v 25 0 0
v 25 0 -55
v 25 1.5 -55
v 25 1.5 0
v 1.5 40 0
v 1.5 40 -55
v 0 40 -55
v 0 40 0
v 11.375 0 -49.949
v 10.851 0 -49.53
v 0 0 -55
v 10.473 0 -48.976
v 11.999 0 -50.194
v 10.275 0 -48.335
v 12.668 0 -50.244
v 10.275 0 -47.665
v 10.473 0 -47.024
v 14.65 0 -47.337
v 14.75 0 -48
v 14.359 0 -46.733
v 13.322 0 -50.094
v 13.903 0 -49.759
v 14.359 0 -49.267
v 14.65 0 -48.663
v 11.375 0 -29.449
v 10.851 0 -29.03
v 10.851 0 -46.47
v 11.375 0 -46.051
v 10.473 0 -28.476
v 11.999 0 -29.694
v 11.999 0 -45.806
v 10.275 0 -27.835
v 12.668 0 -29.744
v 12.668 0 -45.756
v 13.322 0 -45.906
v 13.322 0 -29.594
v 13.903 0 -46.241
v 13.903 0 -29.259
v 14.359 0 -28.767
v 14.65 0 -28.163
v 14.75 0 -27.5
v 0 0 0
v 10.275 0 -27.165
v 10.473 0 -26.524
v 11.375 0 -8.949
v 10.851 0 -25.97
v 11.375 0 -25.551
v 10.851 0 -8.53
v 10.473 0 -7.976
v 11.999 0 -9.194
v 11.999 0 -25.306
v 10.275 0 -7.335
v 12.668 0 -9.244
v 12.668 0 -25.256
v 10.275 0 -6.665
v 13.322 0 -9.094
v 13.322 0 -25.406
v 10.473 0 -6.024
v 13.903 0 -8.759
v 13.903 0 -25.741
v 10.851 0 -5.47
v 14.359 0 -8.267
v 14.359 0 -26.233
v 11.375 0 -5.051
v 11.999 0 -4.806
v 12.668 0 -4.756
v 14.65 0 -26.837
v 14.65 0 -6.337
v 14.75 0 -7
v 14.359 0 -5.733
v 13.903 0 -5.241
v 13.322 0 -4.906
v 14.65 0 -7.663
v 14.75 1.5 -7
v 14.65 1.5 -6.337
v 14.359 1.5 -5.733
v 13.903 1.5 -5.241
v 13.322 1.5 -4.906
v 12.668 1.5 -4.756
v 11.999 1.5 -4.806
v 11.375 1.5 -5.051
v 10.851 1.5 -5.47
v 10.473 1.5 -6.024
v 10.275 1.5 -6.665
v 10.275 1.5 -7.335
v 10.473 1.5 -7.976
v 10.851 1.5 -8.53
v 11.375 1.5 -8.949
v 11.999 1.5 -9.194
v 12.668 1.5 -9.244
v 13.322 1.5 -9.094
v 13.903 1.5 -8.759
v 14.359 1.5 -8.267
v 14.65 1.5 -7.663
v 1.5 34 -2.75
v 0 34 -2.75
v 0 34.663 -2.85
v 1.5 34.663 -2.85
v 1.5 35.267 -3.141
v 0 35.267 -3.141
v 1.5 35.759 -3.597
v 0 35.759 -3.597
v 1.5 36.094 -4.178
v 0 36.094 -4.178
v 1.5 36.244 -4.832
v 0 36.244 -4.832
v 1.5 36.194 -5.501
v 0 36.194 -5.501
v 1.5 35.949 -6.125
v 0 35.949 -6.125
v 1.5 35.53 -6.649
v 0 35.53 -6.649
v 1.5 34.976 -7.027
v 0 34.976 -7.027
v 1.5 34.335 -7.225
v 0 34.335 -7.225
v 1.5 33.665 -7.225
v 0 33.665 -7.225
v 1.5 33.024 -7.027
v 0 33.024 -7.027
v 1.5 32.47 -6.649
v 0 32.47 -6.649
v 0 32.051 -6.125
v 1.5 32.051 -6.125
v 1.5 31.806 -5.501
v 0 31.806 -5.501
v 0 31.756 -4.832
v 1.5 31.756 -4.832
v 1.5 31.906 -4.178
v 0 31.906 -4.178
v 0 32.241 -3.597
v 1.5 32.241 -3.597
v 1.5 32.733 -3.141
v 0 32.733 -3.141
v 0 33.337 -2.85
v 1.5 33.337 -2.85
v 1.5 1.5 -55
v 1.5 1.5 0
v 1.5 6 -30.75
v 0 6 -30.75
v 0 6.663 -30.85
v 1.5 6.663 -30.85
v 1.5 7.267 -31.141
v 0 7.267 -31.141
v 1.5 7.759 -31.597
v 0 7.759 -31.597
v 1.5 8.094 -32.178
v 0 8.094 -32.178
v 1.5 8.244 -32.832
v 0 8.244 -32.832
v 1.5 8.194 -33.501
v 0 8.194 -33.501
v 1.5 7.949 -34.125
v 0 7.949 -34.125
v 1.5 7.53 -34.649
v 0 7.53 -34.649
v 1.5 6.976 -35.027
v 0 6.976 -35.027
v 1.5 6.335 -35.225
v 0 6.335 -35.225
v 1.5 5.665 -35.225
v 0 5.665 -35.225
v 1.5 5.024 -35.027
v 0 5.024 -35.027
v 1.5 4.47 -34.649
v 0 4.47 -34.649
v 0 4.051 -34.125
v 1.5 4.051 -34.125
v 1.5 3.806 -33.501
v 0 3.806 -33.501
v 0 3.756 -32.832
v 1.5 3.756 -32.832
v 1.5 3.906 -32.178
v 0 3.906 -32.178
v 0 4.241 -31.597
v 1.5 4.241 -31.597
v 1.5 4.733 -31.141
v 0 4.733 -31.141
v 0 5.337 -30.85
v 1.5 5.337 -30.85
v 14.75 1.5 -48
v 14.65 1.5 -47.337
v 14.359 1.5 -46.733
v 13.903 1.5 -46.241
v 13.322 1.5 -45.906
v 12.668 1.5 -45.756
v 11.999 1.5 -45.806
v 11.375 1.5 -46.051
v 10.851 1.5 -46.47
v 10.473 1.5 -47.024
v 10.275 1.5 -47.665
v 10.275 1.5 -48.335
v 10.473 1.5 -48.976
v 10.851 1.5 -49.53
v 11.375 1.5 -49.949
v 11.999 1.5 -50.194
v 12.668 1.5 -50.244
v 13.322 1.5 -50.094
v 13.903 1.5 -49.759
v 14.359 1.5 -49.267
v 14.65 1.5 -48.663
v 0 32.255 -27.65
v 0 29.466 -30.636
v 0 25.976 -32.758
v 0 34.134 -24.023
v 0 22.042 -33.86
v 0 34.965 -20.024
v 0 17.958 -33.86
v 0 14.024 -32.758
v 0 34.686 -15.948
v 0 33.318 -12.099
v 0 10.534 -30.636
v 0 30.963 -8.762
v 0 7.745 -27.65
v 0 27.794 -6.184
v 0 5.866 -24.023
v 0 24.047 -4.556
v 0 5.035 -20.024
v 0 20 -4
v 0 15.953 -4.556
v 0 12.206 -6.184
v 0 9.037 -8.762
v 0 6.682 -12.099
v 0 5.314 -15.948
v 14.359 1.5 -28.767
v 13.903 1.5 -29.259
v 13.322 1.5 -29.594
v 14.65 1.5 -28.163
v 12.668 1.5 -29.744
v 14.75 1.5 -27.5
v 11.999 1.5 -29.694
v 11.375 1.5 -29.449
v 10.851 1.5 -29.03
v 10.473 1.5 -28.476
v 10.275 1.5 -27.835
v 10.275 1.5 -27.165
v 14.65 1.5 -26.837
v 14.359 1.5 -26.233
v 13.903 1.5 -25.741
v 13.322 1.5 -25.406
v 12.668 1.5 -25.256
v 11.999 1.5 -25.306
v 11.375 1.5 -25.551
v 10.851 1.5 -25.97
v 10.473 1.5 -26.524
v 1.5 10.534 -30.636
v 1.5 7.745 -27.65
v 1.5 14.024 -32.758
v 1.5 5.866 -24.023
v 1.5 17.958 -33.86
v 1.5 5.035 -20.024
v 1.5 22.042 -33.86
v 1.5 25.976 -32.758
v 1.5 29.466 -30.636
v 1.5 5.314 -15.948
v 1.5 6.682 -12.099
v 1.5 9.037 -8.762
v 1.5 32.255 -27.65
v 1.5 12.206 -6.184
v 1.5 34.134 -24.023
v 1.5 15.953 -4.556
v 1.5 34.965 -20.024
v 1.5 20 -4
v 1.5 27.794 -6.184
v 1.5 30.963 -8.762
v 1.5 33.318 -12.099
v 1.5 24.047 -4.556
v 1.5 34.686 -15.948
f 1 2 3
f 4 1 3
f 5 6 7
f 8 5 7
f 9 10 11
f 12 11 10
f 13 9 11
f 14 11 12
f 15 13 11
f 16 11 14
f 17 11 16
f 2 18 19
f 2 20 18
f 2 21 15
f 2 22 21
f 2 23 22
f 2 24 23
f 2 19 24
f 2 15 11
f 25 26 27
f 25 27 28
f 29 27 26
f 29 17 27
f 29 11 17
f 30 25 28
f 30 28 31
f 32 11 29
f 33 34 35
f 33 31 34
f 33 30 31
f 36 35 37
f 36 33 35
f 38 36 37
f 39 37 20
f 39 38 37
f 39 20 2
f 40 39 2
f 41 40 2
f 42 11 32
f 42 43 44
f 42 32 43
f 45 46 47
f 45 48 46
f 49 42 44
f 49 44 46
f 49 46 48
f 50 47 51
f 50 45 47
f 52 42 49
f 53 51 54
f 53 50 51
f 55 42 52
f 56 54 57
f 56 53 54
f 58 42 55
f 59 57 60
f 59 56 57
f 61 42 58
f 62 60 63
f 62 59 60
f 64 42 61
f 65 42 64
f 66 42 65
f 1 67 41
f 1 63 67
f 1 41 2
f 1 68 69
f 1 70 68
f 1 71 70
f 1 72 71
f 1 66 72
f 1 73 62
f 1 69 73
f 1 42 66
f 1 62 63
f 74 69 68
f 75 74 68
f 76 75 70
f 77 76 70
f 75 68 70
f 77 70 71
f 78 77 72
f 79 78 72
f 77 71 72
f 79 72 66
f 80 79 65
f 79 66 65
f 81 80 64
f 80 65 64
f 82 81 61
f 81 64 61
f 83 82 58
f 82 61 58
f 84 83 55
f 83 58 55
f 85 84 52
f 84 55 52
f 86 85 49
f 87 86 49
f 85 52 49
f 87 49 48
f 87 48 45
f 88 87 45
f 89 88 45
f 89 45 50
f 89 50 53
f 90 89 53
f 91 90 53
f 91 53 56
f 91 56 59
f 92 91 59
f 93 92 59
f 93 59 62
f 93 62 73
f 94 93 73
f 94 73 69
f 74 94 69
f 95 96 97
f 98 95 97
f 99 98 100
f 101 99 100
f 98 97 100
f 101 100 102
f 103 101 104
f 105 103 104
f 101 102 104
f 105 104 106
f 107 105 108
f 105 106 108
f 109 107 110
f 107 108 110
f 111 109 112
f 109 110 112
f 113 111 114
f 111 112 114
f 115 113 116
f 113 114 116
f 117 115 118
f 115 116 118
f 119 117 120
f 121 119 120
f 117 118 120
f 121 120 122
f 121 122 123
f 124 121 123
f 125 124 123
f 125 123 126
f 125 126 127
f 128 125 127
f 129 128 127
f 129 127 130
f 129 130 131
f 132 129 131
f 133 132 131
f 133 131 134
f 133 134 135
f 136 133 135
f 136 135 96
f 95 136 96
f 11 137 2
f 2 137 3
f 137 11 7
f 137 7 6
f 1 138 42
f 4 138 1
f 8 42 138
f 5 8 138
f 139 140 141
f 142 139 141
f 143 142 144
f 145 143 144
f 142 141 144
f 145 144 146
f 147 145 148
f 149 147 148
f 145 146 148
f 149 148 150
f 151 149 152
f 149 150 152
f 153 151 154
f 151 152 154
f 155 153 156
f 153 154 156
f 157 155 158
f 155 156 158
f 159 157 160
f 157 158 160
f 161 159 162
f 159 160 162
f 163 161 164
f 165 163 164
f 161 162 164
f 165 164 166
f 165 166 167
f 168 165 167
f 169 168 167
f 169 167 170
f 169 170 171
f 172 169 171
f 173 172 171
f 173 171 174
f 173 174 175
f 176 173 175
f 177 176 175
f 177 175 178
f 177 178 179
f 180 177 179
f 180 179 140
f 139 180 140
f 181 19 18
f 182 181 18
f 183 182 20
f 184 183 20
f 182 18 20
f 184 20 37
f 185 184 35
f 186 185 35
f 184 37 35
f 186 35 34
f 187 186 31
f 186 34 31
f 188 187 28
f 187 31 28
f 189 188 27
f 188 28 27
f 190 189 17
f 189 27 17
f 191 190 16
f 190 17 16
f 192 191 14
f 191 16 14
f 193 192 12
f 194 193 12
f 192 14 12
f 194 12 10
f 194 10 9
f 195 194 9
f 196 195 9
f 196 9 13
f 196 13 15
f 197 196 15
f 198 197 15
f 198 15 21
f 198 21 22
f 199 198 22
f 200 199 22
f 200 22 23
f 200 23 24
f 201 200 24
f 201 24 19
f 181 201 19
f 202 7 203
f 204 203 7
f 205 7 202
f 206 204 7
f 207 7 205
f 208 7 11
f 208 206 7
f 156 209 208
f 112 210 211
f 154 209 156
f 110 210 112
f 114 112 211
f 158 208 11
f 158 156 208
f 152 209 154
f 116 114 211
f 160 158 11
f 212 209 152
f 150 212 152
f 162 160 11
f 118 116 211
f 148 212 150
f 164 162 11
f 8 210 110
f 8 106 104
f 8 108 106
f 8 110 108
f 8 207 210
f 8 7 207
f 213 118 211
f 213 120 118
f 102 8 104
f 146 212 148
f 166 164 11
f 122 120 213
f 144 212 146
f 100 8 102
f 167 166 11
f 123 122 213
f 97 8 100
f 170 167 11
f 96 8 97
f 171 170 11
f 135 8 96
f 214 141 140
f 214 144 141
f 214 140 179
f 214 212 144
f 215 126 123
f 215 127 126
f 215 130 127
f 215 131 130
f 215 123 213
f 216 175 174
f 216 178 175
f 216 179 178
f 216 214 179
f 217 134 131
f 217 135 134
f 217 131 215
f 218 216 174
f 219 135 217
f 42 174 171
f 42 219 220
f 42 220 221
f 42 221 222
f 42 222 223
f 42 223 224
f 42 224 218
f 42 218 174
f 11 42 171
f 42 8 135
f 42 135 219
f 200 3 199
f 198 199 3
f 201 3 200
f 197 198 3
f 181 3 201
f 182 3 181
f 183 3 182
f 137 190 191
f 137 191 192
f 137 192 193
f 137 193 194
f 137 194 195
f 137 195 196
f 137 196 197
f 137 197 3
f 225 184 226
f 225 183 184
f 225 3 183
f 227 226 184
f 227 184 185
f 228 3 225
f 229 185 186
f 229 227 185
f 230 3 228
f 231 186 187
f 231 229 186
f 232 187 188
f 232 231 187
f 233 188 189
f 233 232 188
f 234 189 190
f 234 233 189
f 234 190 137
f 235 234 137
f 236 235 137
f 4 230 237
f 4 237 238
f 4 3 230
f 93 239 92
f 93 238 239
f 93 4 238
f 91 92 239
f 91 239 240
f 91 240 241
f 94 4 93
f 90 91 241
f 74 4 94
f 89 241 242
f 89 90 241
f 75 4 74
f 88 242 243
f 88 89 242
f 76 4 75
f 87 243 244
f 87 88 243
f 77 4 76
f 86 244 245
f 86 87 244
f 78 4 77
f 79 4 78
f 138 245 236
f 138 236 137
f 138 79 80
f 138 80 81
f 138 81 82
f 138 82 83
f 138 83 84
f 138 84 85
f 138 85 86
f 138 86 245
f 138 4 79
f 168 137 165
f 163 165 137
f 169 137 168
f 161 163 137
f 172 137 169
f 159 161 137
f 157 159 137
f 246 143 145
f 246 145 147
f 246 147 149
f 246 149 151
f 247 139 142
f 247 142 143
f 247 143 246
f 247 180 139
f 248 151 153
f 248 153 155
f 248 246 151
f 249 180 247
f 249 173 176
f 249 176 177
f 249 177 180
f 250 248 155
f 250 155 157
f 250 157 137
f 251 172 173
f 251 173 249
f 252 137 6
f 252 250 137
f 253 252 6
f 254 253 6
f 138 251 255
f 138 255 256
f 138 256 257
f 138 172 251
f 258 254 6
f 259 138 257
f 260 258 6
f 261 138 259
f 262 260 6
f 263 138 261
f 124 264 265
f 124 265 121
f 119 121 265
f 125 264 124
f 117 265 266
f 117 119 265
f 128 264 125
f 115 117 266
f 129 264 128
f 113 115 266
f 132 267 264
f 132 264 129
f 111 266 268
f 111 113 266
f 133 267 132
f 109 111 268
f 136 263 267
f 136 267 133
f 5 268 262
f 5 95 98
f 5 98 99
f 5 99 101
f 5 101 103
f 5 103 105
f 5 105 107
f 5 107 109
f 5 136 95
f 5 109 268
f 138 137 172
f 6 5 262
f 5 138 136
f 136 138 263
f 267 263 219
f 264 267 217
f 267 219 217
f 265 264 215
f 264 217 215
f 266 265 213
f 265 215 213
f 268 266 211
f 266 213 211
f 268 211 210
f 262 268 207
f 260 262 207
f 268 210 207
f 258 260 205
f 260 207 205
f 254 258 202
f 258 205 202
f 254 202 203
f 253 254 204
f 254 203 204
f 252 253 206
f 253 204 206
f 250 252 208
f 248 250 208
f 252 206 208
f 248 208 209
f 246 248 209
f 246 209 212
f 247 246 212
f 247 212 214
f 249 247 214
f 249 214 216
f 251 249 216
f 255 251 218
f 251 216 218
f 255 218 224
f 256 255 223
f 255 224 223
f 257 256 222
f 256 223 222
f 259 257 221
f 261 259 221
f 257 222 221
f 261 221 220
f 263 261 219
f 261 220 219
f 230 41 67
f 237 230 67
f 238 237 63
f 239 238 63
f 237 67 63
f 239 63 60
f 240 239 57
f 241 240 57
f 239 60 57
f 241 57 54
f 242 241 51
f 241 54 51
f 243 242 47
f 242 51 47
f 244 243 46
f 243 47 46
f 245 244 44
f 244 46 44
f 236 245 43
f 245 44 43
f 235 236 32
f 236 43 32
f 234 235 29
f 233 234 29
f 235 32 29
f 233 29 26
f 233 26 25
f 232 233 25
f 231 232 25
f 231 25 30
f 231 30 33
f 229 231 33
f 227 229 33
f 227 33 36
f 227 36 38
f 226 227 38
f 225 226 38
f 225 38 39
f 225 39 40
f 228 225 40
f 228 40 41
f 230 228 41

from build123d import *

# Parameters (mm, degrees)
EXTRU_MINCE1_DEPTH    = 55
D_GAGEMENT_M41_D      = 4.5
D_GAGEMENT_M42_D      = 4.5
D_GAGEMENT_M271_D     = 30
D_GAGEMENT_M271_DEPTH = 1.5
D_GAGEMENT_M271_TIP   = 9.012909285


with BuildPart() as part:
    # Esquisse1 → Extru.-Mince1 (new body)
    with BuildSketch(Plane.XY):
        Polygon((0, 40), (0, 0), (25, 0), (25, 1.5), (1.5, 1.5), (1.5, 40), align=None)
    extrude(amount=-EXTRU_MINCE1_DEPTH)

    # Dégagement M41 (through all)
    with Locations(Plane(origin=(0, 1.5, 0), x_dir=(-1, 0, 0), z_dir=(0, 1, 0))):
        with Locations((-12.5, -7), (-12.5, -27.5), (-12.5, -48)):
            Hole(D_GAGEMENT_M41_D / 2)

    # Dégagement M42 (through all)
    with Locations(Plane(origin=(1.5, 0, 0), x_dir=(0, 0, -1), z_dir=(1, 0, 0))):
        with Locations((5, 34), (33, 6)):
            Hole(D_GAGEMENT_M42_D / 2)

    # Dégagement M271
    with Locations(Plane(origin=(1.5, 0, 0), x_dir=(0, 0, -1), z_dir=(1, 0, 0))):
        with Locations((19, 20)):
            Hole(D_GAGEMENT_M271_D / 2, depth=D_GAGEMENT_M271_DEPTH)
            with Locations((0, 0, -(D_GAGEMENT_M271_DEPTH + D_GAGEMENT_M271_TIP / 2))):  # 118° drill point
                Cone(0, D_GAGEMENT_M271_D / 2, D_GAGEMENT_M271_TIP, mode=Mode.SUBTRACT)


solid = part.part
